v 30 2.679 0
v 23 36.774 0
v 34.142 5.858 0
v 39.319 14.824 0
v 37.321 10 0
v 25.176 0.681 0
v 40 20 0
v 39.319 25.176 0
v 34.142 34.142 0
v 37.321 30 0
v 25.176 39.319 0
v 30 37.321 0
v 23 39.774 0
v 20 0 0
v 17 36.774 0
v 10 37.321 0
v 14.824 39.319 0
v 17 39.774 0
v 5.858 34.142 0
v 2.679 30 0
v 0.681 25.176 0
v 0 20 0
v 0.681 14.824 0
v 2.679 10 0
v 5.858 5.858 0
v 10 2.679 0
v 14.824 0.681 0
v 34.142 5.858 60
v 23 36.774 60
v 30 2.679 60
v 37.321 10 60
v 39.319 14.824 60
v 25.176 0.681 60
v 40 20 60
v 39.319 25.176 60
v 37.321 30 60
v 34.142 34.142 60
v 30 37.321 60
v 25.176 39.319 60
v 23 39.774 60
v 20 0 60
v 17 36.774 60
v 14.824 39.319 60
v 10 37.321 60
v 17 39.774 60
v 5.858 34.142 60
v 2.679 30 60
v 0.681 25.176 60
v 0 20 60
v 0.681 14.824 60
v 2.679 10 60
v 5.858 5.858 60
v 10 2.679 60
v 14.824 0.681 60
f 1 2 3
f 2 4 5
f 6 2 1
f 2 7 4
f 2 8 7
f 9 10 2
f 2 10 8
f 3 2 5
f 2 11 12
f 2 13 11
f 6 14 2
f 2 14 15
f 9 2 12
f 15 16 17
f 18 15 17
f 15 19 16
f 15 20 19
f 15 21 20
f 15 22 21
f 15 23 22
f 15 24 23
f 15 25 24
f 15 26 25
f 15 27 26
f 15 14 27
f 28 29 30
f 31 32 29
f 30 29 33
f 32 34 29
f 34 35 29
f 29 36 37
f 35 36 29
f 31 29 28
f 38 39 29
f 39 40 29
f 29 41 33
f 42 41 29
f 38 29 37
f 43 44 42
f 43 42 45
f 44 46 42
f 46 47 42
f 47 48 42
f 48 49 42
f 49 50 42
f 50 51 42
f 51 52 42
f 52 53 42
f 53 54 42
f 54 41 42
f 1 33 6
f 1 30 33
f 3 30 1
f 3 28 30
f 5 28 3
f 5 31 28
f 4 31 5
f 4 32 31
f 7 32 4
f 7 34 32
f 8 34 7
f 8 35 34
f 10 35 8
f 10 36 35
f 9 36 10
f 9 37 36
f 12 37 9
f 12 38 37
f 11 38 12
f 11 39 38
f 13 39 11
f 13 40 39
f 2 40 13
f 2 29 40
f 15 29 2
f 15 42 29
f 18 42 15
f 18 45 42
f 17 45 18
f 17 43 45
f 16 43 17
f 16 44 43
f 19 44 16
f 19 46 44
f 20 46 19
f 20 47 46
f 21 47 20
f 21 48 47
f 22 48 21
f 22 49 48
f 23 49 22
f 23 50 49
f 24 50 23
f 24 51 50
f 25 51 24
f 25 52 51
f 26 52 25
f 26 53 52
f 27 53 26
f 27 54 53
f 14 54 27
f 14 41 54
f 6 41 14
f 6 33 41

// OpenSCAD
$fn = 32;

// ----------------------------------------------------------------------
// Keyway shaft: d40 shaft, key 6 x 3 mm
// ----------------------------------------------------------------------

// --- parameters (mm) ---
shaft_r = 20;             // shaft radius
key_w = 6;                // keyway width
key_d = 3;                // keyway depth below the surface line
plate_t = 60;             // shaft length, Z (extrusion height)

shaft_d = 2 * shaft_r;  // shaft diameter
circle_step = 15;  // polygon sampling step, degrees

profile = [[14.824, 39.319], [10, 37.321], [5.858, 34.142], [2.679, 30], [0.681, 25.176], [0, 20], [0.681, 14.824], [2.679, 10], [5.858, 5.858], [10, 2.679], [14.824, 0.681], [20, 0], [25.176, 0.681], [30, 2.679], [34.142, 5.858], [37.321, 10], [39.319, 14.824], [40, 20], [39.319, 25.176], [37.321, 30], [34.142, 34.142], [30, 37.321], [25.176, 39.319], [23, 39.774], [23, 36.774], [17, 36.774], [17, 39.774]];  // primary outline, 27 points, counter clockwise

// --- the one profile operation ---
linear_extrude(height = plate_t) polygon(points = profile);
